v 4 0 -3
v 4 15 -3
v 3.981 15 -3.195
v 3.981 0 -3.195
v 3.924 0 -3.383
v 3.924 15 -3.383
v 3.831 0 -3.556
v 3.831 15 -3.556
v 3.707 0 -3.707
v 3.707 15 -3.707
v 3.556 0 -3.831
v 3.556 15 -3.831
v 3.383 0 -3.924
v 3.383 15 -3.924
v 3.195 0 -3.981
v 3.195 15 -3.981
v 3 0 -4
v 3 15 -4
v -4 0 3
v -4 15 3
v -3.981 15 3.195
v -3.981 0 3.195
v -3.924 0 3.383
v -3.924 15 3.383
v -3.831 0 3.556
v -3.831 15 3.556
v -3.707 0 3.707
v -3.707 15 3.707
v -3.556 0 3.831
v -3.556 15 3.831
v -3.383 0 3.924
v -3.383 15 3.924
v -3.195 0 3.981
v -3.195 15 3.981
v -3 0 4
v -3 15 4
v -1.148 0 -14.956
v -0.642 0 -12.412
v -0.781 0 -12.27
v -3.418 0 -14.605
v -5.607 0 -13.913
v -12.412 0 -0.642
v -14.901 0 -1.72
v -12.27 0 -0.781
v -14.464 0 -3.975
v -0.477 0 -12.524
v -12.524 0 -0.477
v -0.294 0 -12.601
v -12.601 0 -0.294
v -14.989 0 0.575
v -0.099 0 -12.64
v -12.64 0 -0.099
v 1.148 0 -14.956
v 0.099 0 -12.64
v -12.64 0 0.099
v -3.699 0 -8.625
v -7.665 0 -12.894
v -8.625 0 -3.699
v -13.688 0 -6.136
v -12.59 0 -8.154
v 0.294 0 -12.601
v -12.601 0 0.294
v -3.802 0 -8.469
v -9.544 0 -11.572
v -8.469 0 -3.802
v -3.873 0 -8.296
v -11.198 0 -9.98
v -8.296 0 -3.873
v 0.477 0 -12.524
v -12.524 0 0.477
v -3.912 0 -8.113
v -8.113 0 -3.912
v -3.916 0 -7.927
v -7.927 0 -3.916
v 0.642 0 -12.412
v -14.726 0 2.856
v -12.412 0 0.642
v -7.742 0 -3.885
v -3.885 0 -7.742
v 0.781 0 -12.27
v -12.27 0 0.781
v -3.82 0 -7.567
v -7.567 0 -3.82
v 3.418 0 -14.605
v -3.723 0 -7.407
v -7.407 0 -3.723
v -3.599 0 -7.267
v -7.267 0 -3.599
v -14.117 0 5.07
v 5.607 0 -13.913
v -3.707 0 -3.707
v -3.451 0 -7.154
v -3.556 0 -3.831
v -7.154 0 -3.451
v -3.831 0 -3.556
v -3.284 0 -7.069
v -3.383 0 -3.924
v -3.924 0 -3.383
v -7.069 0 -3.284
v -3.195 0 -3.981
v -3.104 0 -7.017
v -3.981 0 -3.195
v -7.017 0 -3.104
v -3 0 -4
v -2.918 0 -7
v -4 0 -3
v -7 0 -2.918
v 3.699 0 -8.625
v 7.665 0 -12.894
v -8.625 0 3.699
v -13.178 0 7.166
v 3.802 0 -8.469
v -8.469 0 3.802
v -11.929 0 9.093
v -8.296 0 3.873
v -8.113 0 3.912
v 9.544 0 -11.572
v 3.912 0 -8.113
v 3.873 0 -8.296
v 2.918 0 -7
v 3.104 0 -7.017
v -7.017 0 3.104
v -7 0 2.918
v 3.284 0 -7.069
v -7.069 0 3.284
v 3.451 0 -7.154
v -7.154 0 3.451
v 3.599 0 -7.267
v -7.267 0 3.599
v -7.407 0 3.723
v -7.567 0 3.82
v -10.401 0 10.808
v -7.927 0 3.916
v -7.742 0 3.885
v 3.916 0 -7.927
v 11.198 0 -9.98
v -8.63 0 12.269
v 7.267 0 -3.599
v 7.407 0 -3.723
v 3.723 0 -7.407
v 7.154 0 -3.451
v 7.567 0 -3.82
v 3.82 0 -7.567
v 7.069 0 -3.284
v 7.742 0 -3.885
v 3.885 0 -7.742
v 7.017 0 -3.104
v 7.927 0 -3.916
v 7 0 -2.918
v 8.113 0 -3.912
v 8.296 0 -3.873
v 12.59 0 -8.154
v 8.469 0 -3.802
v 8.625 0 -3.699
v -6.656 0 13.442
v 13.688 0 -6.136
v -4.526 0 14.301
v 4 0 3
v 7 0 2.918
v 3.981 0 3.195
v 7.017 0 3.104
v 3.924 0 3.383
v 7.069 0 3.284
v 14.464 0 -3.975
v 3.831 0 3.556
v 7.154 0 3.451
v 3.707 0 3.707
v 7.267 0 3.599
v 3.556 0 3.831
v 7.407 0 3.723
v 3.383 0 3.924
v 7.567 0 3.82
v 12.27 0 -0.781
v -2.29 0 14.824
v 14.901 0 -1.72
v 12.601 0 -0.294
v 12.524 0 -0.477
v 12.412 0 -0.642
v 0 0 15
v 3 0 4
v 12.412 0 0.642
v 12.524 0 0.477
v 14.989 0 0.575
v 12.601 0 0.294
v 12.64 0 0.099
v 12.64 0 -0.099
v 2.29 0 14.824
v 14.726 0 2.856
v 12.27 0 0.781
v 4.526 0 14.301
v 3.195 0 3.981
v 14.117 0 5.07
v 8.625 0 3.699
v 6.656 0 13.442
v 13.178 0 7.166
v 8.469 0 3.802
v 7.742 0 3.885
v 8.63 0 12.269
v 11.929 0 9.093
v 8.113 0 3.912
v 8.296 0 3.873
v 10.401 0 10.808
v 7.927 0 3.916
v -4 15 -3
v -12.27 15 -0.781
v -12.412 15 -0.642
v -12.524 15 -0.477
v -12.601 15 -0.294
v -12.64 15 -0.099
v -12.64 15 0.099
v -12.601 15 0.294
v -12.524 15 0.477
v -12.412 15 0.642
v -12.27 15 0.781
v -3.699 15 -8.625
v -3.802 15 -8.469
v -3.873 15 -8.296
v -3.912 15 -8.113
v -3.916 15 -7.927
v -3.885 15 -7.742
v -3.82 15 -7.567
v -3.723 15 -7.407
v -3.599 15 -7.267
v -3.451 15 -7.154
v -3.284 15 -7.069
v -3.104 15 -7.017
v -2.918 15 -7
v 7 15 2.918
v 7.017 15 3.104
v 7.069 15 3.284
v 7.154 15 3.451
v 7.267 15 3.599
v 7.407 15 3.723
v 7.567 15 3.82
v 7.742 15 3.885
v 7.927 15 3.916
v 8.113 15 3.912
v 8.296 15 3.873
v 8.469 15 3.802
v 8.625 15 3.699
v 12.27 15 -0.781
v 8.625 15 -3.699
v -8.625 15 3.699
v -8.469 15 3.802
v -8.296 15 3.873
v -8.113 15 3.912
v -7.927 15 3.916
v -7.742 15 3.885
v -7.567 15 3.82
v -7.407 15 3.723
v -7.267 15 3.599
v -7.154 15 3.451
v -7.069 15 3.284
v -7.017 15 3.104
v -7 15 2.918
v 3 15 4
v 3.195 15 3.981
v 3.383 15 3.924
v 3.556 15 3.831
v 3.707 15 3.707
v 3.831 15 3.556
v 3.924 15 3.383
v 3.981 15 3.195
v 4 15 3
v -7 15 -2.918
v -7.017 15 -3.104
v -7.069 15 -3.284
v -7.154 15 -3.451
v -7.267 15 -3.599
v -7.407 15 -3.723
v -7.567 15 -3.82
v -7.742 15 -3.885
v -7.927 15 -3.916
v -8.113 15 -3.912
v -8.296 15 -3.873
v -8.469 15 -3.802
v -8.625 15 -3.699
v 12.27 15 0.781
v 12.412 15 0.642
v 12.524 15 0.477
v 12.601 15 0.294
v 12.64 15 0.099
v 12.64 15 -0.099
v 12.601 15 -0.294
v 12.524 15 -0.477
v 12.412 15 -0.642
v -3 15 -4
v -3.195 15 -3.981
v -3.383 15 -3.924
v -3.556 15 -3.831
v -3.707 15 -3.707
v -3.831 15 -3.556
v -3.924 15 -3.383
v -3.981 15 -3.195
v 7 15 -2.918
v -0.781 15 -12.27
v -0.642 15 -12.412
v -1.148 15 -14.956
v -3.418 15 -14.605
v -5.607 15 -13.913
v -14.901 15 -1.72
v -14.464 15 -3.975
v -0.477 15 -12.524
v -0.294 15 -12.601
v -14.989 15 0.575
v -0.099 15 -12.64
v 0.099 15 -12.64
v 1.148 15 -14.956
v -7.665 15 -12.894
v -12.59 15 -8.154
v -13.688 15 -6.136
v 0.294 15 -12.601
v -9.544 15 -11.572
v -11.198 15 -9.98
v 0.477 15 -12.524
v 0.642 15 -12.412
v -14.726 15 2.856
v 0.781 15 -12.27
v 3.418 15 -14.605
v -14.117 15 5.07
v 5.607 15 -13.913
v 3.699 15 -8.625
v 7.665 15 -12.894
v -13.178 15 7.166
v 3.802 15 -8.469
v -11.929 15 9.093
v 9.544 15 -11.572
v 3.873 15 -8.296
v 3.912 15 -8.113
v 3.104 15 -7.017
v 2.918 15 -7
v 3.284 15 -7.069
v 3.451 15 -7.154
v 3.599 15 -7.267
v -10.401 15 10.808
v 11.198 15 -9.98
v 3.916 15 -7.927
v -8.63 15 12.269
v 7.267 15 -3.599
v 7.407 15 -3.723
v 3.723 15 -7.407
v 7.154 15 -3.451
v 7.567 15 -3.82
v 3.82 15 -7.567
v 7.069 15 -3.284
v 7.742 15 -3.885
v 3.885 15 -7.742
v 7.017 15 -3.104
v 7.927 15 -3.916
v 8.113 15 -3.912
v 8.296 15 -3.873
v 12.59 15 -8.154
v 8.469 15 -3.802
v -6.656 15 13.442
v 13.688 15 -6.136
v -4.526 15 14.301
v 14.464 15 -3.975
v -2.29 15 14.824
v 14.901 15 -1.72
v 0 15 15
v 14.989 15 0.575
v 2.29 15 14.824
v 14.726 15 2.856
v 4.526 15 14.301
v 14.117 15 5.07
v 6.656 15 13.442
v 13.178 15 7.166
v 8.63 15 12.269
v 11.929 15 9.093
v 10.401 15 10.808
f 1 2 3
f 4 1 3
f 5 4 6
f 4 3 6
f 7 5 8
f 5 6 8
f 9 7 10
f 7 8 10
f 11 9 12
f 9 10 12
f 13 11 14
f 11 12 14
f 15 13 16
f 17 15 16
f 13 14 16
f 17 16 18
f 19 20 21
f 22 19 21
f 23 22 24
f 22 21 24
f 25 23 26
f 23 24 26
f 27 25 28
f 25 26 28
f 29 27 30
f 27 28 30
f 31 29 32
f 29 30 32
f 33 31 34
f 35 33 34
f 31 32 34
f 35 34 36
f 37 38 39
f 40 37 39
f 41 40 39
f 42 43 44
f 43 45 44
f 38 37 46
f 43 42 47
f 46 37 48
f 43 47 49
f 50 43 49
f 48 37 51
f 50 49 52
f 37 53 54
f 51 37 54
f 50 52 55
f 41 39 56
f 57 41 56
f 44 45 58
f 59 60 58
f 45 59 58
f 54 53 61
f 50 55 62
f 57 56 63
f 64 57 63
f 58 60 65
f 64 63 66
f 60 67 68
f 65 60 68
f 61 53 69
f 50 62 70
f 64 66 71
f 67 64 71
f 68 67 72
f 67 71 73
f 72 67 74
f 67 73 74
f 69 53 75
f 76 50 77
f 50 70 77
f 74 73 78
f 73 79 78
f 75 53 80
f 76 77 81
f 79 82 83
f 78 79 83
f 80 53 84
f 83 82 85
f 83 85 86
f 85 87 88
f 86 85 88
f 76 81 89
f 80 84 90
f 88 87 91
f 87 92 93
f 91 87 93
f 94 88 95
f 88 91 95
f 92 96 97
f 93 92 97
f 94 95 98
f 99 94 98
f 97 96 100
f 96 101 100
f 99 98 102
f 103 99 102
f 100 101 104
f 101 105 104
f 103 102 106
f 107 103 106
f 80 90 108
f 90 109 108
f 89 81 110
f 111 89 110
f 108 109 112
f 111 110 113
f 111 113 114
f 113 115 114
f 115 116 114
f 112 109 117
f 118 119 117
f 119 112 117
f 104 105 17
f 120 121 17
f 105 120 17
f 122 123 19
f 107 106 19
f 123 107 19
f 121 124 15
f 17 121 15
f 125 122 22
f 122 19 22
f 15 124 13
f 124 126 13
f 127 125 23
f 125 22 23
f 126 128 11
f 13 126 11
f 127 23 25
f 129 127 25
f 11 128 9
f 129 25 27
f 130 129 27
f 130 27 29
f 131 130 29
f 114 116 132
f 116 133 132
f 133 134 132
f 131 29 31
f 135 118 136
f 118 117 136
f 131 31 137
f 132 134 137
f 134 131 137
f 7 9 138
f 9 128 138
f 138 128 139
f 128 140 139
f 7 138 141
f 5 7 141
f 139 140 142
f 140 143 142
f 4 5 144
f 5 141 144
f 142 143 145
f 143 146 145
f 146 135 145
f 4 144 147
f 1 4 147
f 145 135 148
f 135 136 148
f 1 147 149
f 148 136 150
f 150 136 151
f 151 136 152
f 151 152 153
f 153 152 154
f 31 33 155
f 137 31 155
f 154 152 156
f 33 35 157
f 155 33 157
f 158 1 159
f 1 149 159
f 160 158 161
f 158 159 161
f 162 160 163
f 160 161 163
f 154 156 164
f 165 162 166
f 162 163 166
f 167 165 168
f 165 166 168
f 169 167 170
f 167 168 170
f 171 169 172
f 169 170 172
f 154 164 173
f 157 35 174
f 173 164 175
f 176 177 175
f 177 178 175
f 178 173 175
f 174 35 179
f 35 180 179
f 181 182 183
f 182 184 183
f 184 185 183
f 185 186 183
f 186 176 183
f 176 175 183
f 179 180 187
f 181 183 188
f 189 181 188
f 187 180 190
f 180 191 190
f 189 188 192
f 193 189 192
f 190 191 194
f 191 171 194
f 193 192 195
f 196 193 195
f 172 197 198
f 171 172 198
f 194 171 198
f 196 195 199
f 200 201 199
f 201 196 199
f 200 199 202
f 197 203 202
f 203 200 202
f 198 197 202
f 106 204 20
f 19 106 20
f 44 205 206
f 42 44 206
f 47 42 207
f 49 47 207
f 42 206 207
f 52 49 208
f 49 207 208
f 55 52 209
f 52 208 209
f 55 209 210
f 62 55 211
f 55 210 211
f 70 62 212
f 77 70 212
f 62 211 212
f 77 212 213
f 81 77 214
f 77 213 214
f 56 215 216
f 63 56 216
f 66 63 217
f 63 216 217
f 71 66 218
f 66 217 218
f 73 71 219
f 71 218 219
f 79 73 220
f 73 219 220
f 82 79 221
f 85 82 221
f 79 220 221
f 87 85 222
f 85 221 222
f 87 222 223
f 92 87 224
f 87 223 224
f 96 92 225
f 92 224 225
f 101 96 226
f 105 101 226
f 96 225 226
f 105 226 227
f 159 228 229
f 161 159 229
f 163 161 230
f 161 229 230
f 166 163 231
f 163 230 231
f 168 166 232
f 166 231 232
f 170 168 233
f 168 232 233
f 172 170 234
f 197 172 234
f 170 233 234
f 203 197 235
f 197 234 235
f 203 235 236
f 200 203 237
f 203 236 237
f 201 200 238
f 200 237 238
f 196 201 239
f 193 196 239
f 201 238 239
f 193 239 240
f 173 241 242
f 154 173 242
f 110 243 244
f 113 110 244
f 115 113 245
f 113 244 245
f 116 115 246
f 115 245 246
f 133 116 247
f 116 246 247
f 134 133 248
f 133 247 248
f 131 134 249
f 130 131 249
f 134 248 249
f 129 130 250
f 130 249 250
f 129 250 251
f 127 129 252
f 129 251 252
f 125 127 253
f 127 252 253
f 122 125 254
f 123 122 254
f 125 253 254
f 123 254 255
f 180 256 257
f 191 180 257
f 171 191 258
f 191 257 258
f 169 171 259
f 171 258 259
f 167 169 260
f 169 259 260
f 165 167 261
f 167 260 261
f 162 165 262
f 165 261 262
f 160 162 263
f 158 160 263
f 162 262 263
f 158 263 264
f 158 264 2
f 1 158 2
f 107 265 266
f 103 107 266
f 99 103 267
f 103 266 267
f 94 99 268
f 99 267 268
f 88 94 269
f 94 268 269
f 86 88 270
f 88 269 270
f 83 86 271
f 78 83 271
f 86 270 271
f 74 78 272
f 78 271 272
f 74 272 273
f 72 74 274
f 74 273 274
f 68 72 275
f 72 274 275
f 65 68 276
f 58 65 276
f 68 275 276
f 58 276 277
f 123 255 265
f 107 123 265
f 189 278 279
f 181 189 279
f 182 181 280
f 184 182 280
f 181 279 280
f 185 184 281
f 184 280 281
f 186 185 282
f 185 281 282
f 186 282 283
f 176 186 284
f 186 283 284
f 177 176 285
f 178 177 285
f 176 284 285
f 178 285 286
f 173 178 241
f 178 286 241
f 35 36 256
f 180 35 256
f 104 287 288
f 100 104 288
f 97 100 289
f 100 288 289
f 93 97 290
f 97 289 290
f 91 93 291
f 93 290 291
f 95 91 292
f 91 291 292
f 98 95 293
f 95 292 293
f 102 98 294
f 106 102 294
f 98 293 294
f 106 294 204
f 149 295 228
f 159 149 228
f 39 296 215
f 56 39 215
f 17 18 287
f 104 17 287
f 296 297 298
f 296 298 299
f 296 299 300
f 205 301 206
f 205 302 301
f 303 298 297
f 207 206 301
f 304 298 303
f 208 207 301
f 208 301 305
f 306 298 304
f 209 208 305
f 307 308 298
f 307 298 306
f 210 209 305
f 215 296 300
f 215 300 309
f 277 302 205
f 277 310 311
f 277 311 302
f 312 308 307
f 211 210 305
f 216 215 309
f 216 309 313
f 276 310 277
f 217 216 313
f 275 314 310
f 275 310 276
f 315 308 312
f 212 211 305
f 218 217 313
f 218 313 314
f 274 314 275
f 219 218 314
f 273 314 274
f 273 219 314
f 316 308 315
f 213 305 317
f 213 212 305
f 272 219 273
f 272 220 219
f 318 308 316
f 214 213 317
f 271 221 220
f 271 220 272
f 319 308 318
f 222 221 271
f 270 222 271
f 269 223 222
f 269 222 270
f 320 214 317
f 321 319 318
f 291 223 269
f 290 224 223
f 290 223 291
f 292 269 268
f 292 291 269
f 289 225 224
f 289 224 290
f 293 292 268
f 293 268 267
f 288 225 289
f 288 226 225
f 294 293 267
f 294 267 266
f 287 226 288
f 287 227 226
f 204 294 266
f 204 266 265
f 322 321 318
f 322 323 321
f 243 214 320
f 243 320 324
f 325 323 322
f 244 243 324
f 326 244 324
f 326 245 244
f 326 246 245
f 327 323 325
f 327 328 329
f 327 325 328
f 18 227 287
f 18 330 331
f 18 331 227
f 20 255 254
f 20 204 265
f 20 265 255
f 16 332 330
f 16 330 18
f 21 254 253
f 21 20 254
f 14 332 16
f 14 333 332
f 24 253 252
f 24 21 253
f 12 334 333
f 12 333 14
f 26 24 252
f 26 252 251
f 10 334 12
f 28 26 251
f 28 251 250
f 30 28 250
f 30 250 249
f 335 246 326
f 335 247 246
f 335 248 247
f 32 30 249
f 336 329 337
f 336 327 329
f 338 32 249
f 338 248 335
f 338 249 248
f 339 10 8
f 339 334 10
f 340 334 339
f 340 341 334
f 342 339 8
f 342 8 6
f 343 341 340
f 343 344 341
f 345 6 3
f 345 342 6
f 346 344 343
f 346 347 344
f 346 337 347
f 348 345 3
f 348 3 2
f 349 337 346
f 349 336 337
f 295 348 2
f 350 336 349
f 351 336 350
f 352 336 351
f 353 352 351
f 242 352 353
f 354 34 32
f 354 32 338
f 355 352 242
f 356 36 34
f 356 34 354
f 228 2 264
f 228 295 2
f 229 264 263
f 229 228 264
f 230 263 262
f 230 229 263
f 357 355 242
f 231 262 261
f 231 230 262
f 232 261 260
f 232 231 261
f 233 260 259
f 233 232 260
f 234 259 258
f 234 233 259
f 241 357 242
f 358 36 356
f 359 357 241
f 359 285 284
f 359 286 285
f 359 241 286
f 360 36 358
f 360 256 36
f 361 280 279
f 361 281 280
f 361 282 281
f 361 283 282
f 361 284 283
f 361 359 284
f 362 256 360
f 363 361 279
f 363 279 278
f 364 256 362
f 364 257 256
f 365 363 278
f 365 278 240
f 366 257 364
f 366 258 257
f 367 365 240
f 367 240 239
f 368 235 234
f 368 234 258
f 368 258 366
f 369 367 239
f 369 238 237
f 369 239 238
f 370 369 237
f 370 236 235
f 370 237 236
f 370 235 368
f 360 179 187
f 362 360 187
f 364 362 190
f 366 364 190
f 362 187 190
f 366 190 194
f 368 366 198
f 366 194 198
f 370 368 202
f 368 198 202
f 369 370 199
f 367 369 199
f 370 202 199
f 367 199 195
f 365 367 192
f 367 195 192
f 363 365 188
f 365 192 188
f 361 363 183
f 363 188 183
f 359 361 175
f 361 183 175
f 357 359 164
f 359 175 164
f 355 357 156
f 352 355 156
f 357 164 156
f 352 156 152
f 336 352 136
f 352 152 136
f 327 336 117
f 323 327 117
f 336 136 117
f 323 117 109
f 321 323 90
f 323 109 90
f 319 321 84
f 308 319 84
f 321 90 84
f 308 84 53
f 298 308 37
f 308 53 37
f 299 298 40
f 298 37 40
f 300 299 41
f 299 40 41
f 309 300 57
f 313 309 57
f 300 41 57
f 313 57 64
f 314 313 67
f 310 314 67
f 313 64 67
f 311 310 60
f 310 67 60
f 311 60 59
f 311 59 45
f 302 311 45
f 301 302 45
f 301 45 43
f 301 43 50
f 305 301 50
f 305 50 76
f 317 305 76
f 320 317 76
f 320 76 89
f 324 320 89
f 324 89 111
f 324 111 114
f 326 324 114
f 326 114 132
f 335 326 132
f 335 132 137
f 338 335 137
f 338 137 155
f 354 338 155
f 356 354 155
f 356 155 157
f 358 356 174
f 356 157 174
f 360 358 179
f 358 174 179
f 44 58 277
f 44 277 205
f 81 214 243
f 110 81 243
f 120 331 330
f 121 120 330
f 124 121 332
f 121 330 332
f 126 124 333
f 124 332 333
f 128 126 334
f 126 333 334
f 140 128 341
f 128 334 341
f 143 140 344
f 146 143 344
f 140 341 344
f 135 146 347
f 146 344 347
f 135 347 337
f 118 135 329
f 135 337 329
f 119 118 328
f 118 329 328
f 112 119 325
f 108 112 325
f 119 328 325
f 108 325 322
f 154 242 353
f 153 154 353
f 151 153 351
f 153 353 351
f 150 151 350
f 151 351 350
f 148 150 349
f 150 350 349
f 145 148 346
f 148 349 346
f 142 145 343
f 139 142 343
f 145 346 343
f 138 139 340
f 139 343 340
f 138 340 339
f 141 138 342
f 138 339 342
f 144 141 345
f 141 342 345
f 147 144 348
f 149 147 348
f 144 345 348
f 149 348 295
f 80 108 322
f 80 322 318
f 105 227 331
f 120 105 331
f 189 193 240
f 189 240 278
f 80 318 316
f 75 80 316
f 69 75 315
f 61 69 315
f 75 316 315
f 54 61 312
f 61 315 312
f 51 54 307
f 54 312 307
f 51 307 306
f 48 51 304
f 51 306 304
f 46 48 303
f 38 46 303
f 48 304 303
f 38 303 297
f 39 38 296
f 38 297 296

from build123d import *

# Parameters (mm, degrees)
SKETCH1_R           = 15
BOSS_EXTRUDE1_DEPTH = 15
CUT_EXTRUDE1_DEPTH  = 15


with BuildPart() as part:
    # Sketch1 → Boss-Extrude1 (new body)
    with BuildSketch(Plane(origin=(0, 0, 0), x_dir=(1, 0, 0), z_dir=(0, 1, 0))):
        with Locations(Location((0, 0, 0), (0, 0, 270))):
            Circle(SKETCH1_R)
    extrude(amount=BOSS_EXTRUDE1_DEPTH)

    # Sketch2 → Cut-Extrude1 (cut)
    with BuildSketch(Plane(origin=(0, 15, 0), x_dir=(1, 0, 0), z_dir=(0, 1, 0))):
        with BuildLine():
            Line((-0.78062475, 12.269997998), (-3.69895875, 8.625))
            ThreePointArc((-3.69895875, 8.625), (-3.819721819, 7.566987298), (-2.918334001, 7))
            Line((-2.918334001, 7), (2.918334001, 7))
            ThreePointArc((2.918334001, 7), (3.819721819, 7.566987298), (3.69895875, 8.625))
            Line((3.69895875, 8.625), (0.78062475, 12.269997998))
            ThreePointArc((0.78062475, 12.269997998), (0, 12.644997998), (-0.78062475, 12.269997998))
        make_face()
        with BuildLine():
            Line((8.625, -3.69895875), (12.269997998, -0.78062475))
            ThreePointArc((12.269997998, -0.78062475), (12.644997998, 0), (12.269997998, 0.78062475))
            Line((12.269997998, 0.78062475), (8.625, 3.69895875))
            ThreePointArc((8.625, 3.69895875), (7.566987298, 3.819721819), (7, 2.918334001))
            Line((7, 2.918334001), (7, -2.918334001))
            ThreePointArc((7, -2.918334001), (7.566987298, -3.819721819), (8.625, -3.69895875))
        make_face()
        with BuildLine():
            Line((-3, -4), (3, -4))
            ThreePointArc((3, -4), (3.707106781, -3.707106781), (4, -3))
            Line((4, -3), (4, 3))
            ThreePointArc((4, 3), (3.707106781, 3.707106781), (3, 4))
            Line((3, 4), (-3, 4))
            ThreePointArc((-3, 4), (-3.707106781, 3.707106781), (-4, 3))
            Line((-4, 3), (-4, -3))
            ThreePointArc((-4, -3), (-3.707106781, -3.707106781), (-3, -4))
        make_face()
        with BuildLine():
            Line((-8.625, 3.69895875), (-12.269997998, 0.78062475))
            ThreePointArc((-12.269997998, 0.78062475), (-12.644997998, 0), (-12.269997998, -0.78062475))
            Line((-12.269997998, -0.78062475), (-8.625, -3.69895875))
            ThreePointArc((-8.625, -3.69895875), (-7.566987298, -3.819721819), (-7, -2.918334001))
            Line((-7, -2.918334001), (-7, 2.918334001))
            ThreePointArc((-7, 2.918334001), (-7.566987298, 3.819721819), (-8.625, 3.69895875))
        make_face()
    extrude(amount=-CUT_EXTRUDE1_DEPTH, mode=Mode.SUBTRACT)


solid = part.part
